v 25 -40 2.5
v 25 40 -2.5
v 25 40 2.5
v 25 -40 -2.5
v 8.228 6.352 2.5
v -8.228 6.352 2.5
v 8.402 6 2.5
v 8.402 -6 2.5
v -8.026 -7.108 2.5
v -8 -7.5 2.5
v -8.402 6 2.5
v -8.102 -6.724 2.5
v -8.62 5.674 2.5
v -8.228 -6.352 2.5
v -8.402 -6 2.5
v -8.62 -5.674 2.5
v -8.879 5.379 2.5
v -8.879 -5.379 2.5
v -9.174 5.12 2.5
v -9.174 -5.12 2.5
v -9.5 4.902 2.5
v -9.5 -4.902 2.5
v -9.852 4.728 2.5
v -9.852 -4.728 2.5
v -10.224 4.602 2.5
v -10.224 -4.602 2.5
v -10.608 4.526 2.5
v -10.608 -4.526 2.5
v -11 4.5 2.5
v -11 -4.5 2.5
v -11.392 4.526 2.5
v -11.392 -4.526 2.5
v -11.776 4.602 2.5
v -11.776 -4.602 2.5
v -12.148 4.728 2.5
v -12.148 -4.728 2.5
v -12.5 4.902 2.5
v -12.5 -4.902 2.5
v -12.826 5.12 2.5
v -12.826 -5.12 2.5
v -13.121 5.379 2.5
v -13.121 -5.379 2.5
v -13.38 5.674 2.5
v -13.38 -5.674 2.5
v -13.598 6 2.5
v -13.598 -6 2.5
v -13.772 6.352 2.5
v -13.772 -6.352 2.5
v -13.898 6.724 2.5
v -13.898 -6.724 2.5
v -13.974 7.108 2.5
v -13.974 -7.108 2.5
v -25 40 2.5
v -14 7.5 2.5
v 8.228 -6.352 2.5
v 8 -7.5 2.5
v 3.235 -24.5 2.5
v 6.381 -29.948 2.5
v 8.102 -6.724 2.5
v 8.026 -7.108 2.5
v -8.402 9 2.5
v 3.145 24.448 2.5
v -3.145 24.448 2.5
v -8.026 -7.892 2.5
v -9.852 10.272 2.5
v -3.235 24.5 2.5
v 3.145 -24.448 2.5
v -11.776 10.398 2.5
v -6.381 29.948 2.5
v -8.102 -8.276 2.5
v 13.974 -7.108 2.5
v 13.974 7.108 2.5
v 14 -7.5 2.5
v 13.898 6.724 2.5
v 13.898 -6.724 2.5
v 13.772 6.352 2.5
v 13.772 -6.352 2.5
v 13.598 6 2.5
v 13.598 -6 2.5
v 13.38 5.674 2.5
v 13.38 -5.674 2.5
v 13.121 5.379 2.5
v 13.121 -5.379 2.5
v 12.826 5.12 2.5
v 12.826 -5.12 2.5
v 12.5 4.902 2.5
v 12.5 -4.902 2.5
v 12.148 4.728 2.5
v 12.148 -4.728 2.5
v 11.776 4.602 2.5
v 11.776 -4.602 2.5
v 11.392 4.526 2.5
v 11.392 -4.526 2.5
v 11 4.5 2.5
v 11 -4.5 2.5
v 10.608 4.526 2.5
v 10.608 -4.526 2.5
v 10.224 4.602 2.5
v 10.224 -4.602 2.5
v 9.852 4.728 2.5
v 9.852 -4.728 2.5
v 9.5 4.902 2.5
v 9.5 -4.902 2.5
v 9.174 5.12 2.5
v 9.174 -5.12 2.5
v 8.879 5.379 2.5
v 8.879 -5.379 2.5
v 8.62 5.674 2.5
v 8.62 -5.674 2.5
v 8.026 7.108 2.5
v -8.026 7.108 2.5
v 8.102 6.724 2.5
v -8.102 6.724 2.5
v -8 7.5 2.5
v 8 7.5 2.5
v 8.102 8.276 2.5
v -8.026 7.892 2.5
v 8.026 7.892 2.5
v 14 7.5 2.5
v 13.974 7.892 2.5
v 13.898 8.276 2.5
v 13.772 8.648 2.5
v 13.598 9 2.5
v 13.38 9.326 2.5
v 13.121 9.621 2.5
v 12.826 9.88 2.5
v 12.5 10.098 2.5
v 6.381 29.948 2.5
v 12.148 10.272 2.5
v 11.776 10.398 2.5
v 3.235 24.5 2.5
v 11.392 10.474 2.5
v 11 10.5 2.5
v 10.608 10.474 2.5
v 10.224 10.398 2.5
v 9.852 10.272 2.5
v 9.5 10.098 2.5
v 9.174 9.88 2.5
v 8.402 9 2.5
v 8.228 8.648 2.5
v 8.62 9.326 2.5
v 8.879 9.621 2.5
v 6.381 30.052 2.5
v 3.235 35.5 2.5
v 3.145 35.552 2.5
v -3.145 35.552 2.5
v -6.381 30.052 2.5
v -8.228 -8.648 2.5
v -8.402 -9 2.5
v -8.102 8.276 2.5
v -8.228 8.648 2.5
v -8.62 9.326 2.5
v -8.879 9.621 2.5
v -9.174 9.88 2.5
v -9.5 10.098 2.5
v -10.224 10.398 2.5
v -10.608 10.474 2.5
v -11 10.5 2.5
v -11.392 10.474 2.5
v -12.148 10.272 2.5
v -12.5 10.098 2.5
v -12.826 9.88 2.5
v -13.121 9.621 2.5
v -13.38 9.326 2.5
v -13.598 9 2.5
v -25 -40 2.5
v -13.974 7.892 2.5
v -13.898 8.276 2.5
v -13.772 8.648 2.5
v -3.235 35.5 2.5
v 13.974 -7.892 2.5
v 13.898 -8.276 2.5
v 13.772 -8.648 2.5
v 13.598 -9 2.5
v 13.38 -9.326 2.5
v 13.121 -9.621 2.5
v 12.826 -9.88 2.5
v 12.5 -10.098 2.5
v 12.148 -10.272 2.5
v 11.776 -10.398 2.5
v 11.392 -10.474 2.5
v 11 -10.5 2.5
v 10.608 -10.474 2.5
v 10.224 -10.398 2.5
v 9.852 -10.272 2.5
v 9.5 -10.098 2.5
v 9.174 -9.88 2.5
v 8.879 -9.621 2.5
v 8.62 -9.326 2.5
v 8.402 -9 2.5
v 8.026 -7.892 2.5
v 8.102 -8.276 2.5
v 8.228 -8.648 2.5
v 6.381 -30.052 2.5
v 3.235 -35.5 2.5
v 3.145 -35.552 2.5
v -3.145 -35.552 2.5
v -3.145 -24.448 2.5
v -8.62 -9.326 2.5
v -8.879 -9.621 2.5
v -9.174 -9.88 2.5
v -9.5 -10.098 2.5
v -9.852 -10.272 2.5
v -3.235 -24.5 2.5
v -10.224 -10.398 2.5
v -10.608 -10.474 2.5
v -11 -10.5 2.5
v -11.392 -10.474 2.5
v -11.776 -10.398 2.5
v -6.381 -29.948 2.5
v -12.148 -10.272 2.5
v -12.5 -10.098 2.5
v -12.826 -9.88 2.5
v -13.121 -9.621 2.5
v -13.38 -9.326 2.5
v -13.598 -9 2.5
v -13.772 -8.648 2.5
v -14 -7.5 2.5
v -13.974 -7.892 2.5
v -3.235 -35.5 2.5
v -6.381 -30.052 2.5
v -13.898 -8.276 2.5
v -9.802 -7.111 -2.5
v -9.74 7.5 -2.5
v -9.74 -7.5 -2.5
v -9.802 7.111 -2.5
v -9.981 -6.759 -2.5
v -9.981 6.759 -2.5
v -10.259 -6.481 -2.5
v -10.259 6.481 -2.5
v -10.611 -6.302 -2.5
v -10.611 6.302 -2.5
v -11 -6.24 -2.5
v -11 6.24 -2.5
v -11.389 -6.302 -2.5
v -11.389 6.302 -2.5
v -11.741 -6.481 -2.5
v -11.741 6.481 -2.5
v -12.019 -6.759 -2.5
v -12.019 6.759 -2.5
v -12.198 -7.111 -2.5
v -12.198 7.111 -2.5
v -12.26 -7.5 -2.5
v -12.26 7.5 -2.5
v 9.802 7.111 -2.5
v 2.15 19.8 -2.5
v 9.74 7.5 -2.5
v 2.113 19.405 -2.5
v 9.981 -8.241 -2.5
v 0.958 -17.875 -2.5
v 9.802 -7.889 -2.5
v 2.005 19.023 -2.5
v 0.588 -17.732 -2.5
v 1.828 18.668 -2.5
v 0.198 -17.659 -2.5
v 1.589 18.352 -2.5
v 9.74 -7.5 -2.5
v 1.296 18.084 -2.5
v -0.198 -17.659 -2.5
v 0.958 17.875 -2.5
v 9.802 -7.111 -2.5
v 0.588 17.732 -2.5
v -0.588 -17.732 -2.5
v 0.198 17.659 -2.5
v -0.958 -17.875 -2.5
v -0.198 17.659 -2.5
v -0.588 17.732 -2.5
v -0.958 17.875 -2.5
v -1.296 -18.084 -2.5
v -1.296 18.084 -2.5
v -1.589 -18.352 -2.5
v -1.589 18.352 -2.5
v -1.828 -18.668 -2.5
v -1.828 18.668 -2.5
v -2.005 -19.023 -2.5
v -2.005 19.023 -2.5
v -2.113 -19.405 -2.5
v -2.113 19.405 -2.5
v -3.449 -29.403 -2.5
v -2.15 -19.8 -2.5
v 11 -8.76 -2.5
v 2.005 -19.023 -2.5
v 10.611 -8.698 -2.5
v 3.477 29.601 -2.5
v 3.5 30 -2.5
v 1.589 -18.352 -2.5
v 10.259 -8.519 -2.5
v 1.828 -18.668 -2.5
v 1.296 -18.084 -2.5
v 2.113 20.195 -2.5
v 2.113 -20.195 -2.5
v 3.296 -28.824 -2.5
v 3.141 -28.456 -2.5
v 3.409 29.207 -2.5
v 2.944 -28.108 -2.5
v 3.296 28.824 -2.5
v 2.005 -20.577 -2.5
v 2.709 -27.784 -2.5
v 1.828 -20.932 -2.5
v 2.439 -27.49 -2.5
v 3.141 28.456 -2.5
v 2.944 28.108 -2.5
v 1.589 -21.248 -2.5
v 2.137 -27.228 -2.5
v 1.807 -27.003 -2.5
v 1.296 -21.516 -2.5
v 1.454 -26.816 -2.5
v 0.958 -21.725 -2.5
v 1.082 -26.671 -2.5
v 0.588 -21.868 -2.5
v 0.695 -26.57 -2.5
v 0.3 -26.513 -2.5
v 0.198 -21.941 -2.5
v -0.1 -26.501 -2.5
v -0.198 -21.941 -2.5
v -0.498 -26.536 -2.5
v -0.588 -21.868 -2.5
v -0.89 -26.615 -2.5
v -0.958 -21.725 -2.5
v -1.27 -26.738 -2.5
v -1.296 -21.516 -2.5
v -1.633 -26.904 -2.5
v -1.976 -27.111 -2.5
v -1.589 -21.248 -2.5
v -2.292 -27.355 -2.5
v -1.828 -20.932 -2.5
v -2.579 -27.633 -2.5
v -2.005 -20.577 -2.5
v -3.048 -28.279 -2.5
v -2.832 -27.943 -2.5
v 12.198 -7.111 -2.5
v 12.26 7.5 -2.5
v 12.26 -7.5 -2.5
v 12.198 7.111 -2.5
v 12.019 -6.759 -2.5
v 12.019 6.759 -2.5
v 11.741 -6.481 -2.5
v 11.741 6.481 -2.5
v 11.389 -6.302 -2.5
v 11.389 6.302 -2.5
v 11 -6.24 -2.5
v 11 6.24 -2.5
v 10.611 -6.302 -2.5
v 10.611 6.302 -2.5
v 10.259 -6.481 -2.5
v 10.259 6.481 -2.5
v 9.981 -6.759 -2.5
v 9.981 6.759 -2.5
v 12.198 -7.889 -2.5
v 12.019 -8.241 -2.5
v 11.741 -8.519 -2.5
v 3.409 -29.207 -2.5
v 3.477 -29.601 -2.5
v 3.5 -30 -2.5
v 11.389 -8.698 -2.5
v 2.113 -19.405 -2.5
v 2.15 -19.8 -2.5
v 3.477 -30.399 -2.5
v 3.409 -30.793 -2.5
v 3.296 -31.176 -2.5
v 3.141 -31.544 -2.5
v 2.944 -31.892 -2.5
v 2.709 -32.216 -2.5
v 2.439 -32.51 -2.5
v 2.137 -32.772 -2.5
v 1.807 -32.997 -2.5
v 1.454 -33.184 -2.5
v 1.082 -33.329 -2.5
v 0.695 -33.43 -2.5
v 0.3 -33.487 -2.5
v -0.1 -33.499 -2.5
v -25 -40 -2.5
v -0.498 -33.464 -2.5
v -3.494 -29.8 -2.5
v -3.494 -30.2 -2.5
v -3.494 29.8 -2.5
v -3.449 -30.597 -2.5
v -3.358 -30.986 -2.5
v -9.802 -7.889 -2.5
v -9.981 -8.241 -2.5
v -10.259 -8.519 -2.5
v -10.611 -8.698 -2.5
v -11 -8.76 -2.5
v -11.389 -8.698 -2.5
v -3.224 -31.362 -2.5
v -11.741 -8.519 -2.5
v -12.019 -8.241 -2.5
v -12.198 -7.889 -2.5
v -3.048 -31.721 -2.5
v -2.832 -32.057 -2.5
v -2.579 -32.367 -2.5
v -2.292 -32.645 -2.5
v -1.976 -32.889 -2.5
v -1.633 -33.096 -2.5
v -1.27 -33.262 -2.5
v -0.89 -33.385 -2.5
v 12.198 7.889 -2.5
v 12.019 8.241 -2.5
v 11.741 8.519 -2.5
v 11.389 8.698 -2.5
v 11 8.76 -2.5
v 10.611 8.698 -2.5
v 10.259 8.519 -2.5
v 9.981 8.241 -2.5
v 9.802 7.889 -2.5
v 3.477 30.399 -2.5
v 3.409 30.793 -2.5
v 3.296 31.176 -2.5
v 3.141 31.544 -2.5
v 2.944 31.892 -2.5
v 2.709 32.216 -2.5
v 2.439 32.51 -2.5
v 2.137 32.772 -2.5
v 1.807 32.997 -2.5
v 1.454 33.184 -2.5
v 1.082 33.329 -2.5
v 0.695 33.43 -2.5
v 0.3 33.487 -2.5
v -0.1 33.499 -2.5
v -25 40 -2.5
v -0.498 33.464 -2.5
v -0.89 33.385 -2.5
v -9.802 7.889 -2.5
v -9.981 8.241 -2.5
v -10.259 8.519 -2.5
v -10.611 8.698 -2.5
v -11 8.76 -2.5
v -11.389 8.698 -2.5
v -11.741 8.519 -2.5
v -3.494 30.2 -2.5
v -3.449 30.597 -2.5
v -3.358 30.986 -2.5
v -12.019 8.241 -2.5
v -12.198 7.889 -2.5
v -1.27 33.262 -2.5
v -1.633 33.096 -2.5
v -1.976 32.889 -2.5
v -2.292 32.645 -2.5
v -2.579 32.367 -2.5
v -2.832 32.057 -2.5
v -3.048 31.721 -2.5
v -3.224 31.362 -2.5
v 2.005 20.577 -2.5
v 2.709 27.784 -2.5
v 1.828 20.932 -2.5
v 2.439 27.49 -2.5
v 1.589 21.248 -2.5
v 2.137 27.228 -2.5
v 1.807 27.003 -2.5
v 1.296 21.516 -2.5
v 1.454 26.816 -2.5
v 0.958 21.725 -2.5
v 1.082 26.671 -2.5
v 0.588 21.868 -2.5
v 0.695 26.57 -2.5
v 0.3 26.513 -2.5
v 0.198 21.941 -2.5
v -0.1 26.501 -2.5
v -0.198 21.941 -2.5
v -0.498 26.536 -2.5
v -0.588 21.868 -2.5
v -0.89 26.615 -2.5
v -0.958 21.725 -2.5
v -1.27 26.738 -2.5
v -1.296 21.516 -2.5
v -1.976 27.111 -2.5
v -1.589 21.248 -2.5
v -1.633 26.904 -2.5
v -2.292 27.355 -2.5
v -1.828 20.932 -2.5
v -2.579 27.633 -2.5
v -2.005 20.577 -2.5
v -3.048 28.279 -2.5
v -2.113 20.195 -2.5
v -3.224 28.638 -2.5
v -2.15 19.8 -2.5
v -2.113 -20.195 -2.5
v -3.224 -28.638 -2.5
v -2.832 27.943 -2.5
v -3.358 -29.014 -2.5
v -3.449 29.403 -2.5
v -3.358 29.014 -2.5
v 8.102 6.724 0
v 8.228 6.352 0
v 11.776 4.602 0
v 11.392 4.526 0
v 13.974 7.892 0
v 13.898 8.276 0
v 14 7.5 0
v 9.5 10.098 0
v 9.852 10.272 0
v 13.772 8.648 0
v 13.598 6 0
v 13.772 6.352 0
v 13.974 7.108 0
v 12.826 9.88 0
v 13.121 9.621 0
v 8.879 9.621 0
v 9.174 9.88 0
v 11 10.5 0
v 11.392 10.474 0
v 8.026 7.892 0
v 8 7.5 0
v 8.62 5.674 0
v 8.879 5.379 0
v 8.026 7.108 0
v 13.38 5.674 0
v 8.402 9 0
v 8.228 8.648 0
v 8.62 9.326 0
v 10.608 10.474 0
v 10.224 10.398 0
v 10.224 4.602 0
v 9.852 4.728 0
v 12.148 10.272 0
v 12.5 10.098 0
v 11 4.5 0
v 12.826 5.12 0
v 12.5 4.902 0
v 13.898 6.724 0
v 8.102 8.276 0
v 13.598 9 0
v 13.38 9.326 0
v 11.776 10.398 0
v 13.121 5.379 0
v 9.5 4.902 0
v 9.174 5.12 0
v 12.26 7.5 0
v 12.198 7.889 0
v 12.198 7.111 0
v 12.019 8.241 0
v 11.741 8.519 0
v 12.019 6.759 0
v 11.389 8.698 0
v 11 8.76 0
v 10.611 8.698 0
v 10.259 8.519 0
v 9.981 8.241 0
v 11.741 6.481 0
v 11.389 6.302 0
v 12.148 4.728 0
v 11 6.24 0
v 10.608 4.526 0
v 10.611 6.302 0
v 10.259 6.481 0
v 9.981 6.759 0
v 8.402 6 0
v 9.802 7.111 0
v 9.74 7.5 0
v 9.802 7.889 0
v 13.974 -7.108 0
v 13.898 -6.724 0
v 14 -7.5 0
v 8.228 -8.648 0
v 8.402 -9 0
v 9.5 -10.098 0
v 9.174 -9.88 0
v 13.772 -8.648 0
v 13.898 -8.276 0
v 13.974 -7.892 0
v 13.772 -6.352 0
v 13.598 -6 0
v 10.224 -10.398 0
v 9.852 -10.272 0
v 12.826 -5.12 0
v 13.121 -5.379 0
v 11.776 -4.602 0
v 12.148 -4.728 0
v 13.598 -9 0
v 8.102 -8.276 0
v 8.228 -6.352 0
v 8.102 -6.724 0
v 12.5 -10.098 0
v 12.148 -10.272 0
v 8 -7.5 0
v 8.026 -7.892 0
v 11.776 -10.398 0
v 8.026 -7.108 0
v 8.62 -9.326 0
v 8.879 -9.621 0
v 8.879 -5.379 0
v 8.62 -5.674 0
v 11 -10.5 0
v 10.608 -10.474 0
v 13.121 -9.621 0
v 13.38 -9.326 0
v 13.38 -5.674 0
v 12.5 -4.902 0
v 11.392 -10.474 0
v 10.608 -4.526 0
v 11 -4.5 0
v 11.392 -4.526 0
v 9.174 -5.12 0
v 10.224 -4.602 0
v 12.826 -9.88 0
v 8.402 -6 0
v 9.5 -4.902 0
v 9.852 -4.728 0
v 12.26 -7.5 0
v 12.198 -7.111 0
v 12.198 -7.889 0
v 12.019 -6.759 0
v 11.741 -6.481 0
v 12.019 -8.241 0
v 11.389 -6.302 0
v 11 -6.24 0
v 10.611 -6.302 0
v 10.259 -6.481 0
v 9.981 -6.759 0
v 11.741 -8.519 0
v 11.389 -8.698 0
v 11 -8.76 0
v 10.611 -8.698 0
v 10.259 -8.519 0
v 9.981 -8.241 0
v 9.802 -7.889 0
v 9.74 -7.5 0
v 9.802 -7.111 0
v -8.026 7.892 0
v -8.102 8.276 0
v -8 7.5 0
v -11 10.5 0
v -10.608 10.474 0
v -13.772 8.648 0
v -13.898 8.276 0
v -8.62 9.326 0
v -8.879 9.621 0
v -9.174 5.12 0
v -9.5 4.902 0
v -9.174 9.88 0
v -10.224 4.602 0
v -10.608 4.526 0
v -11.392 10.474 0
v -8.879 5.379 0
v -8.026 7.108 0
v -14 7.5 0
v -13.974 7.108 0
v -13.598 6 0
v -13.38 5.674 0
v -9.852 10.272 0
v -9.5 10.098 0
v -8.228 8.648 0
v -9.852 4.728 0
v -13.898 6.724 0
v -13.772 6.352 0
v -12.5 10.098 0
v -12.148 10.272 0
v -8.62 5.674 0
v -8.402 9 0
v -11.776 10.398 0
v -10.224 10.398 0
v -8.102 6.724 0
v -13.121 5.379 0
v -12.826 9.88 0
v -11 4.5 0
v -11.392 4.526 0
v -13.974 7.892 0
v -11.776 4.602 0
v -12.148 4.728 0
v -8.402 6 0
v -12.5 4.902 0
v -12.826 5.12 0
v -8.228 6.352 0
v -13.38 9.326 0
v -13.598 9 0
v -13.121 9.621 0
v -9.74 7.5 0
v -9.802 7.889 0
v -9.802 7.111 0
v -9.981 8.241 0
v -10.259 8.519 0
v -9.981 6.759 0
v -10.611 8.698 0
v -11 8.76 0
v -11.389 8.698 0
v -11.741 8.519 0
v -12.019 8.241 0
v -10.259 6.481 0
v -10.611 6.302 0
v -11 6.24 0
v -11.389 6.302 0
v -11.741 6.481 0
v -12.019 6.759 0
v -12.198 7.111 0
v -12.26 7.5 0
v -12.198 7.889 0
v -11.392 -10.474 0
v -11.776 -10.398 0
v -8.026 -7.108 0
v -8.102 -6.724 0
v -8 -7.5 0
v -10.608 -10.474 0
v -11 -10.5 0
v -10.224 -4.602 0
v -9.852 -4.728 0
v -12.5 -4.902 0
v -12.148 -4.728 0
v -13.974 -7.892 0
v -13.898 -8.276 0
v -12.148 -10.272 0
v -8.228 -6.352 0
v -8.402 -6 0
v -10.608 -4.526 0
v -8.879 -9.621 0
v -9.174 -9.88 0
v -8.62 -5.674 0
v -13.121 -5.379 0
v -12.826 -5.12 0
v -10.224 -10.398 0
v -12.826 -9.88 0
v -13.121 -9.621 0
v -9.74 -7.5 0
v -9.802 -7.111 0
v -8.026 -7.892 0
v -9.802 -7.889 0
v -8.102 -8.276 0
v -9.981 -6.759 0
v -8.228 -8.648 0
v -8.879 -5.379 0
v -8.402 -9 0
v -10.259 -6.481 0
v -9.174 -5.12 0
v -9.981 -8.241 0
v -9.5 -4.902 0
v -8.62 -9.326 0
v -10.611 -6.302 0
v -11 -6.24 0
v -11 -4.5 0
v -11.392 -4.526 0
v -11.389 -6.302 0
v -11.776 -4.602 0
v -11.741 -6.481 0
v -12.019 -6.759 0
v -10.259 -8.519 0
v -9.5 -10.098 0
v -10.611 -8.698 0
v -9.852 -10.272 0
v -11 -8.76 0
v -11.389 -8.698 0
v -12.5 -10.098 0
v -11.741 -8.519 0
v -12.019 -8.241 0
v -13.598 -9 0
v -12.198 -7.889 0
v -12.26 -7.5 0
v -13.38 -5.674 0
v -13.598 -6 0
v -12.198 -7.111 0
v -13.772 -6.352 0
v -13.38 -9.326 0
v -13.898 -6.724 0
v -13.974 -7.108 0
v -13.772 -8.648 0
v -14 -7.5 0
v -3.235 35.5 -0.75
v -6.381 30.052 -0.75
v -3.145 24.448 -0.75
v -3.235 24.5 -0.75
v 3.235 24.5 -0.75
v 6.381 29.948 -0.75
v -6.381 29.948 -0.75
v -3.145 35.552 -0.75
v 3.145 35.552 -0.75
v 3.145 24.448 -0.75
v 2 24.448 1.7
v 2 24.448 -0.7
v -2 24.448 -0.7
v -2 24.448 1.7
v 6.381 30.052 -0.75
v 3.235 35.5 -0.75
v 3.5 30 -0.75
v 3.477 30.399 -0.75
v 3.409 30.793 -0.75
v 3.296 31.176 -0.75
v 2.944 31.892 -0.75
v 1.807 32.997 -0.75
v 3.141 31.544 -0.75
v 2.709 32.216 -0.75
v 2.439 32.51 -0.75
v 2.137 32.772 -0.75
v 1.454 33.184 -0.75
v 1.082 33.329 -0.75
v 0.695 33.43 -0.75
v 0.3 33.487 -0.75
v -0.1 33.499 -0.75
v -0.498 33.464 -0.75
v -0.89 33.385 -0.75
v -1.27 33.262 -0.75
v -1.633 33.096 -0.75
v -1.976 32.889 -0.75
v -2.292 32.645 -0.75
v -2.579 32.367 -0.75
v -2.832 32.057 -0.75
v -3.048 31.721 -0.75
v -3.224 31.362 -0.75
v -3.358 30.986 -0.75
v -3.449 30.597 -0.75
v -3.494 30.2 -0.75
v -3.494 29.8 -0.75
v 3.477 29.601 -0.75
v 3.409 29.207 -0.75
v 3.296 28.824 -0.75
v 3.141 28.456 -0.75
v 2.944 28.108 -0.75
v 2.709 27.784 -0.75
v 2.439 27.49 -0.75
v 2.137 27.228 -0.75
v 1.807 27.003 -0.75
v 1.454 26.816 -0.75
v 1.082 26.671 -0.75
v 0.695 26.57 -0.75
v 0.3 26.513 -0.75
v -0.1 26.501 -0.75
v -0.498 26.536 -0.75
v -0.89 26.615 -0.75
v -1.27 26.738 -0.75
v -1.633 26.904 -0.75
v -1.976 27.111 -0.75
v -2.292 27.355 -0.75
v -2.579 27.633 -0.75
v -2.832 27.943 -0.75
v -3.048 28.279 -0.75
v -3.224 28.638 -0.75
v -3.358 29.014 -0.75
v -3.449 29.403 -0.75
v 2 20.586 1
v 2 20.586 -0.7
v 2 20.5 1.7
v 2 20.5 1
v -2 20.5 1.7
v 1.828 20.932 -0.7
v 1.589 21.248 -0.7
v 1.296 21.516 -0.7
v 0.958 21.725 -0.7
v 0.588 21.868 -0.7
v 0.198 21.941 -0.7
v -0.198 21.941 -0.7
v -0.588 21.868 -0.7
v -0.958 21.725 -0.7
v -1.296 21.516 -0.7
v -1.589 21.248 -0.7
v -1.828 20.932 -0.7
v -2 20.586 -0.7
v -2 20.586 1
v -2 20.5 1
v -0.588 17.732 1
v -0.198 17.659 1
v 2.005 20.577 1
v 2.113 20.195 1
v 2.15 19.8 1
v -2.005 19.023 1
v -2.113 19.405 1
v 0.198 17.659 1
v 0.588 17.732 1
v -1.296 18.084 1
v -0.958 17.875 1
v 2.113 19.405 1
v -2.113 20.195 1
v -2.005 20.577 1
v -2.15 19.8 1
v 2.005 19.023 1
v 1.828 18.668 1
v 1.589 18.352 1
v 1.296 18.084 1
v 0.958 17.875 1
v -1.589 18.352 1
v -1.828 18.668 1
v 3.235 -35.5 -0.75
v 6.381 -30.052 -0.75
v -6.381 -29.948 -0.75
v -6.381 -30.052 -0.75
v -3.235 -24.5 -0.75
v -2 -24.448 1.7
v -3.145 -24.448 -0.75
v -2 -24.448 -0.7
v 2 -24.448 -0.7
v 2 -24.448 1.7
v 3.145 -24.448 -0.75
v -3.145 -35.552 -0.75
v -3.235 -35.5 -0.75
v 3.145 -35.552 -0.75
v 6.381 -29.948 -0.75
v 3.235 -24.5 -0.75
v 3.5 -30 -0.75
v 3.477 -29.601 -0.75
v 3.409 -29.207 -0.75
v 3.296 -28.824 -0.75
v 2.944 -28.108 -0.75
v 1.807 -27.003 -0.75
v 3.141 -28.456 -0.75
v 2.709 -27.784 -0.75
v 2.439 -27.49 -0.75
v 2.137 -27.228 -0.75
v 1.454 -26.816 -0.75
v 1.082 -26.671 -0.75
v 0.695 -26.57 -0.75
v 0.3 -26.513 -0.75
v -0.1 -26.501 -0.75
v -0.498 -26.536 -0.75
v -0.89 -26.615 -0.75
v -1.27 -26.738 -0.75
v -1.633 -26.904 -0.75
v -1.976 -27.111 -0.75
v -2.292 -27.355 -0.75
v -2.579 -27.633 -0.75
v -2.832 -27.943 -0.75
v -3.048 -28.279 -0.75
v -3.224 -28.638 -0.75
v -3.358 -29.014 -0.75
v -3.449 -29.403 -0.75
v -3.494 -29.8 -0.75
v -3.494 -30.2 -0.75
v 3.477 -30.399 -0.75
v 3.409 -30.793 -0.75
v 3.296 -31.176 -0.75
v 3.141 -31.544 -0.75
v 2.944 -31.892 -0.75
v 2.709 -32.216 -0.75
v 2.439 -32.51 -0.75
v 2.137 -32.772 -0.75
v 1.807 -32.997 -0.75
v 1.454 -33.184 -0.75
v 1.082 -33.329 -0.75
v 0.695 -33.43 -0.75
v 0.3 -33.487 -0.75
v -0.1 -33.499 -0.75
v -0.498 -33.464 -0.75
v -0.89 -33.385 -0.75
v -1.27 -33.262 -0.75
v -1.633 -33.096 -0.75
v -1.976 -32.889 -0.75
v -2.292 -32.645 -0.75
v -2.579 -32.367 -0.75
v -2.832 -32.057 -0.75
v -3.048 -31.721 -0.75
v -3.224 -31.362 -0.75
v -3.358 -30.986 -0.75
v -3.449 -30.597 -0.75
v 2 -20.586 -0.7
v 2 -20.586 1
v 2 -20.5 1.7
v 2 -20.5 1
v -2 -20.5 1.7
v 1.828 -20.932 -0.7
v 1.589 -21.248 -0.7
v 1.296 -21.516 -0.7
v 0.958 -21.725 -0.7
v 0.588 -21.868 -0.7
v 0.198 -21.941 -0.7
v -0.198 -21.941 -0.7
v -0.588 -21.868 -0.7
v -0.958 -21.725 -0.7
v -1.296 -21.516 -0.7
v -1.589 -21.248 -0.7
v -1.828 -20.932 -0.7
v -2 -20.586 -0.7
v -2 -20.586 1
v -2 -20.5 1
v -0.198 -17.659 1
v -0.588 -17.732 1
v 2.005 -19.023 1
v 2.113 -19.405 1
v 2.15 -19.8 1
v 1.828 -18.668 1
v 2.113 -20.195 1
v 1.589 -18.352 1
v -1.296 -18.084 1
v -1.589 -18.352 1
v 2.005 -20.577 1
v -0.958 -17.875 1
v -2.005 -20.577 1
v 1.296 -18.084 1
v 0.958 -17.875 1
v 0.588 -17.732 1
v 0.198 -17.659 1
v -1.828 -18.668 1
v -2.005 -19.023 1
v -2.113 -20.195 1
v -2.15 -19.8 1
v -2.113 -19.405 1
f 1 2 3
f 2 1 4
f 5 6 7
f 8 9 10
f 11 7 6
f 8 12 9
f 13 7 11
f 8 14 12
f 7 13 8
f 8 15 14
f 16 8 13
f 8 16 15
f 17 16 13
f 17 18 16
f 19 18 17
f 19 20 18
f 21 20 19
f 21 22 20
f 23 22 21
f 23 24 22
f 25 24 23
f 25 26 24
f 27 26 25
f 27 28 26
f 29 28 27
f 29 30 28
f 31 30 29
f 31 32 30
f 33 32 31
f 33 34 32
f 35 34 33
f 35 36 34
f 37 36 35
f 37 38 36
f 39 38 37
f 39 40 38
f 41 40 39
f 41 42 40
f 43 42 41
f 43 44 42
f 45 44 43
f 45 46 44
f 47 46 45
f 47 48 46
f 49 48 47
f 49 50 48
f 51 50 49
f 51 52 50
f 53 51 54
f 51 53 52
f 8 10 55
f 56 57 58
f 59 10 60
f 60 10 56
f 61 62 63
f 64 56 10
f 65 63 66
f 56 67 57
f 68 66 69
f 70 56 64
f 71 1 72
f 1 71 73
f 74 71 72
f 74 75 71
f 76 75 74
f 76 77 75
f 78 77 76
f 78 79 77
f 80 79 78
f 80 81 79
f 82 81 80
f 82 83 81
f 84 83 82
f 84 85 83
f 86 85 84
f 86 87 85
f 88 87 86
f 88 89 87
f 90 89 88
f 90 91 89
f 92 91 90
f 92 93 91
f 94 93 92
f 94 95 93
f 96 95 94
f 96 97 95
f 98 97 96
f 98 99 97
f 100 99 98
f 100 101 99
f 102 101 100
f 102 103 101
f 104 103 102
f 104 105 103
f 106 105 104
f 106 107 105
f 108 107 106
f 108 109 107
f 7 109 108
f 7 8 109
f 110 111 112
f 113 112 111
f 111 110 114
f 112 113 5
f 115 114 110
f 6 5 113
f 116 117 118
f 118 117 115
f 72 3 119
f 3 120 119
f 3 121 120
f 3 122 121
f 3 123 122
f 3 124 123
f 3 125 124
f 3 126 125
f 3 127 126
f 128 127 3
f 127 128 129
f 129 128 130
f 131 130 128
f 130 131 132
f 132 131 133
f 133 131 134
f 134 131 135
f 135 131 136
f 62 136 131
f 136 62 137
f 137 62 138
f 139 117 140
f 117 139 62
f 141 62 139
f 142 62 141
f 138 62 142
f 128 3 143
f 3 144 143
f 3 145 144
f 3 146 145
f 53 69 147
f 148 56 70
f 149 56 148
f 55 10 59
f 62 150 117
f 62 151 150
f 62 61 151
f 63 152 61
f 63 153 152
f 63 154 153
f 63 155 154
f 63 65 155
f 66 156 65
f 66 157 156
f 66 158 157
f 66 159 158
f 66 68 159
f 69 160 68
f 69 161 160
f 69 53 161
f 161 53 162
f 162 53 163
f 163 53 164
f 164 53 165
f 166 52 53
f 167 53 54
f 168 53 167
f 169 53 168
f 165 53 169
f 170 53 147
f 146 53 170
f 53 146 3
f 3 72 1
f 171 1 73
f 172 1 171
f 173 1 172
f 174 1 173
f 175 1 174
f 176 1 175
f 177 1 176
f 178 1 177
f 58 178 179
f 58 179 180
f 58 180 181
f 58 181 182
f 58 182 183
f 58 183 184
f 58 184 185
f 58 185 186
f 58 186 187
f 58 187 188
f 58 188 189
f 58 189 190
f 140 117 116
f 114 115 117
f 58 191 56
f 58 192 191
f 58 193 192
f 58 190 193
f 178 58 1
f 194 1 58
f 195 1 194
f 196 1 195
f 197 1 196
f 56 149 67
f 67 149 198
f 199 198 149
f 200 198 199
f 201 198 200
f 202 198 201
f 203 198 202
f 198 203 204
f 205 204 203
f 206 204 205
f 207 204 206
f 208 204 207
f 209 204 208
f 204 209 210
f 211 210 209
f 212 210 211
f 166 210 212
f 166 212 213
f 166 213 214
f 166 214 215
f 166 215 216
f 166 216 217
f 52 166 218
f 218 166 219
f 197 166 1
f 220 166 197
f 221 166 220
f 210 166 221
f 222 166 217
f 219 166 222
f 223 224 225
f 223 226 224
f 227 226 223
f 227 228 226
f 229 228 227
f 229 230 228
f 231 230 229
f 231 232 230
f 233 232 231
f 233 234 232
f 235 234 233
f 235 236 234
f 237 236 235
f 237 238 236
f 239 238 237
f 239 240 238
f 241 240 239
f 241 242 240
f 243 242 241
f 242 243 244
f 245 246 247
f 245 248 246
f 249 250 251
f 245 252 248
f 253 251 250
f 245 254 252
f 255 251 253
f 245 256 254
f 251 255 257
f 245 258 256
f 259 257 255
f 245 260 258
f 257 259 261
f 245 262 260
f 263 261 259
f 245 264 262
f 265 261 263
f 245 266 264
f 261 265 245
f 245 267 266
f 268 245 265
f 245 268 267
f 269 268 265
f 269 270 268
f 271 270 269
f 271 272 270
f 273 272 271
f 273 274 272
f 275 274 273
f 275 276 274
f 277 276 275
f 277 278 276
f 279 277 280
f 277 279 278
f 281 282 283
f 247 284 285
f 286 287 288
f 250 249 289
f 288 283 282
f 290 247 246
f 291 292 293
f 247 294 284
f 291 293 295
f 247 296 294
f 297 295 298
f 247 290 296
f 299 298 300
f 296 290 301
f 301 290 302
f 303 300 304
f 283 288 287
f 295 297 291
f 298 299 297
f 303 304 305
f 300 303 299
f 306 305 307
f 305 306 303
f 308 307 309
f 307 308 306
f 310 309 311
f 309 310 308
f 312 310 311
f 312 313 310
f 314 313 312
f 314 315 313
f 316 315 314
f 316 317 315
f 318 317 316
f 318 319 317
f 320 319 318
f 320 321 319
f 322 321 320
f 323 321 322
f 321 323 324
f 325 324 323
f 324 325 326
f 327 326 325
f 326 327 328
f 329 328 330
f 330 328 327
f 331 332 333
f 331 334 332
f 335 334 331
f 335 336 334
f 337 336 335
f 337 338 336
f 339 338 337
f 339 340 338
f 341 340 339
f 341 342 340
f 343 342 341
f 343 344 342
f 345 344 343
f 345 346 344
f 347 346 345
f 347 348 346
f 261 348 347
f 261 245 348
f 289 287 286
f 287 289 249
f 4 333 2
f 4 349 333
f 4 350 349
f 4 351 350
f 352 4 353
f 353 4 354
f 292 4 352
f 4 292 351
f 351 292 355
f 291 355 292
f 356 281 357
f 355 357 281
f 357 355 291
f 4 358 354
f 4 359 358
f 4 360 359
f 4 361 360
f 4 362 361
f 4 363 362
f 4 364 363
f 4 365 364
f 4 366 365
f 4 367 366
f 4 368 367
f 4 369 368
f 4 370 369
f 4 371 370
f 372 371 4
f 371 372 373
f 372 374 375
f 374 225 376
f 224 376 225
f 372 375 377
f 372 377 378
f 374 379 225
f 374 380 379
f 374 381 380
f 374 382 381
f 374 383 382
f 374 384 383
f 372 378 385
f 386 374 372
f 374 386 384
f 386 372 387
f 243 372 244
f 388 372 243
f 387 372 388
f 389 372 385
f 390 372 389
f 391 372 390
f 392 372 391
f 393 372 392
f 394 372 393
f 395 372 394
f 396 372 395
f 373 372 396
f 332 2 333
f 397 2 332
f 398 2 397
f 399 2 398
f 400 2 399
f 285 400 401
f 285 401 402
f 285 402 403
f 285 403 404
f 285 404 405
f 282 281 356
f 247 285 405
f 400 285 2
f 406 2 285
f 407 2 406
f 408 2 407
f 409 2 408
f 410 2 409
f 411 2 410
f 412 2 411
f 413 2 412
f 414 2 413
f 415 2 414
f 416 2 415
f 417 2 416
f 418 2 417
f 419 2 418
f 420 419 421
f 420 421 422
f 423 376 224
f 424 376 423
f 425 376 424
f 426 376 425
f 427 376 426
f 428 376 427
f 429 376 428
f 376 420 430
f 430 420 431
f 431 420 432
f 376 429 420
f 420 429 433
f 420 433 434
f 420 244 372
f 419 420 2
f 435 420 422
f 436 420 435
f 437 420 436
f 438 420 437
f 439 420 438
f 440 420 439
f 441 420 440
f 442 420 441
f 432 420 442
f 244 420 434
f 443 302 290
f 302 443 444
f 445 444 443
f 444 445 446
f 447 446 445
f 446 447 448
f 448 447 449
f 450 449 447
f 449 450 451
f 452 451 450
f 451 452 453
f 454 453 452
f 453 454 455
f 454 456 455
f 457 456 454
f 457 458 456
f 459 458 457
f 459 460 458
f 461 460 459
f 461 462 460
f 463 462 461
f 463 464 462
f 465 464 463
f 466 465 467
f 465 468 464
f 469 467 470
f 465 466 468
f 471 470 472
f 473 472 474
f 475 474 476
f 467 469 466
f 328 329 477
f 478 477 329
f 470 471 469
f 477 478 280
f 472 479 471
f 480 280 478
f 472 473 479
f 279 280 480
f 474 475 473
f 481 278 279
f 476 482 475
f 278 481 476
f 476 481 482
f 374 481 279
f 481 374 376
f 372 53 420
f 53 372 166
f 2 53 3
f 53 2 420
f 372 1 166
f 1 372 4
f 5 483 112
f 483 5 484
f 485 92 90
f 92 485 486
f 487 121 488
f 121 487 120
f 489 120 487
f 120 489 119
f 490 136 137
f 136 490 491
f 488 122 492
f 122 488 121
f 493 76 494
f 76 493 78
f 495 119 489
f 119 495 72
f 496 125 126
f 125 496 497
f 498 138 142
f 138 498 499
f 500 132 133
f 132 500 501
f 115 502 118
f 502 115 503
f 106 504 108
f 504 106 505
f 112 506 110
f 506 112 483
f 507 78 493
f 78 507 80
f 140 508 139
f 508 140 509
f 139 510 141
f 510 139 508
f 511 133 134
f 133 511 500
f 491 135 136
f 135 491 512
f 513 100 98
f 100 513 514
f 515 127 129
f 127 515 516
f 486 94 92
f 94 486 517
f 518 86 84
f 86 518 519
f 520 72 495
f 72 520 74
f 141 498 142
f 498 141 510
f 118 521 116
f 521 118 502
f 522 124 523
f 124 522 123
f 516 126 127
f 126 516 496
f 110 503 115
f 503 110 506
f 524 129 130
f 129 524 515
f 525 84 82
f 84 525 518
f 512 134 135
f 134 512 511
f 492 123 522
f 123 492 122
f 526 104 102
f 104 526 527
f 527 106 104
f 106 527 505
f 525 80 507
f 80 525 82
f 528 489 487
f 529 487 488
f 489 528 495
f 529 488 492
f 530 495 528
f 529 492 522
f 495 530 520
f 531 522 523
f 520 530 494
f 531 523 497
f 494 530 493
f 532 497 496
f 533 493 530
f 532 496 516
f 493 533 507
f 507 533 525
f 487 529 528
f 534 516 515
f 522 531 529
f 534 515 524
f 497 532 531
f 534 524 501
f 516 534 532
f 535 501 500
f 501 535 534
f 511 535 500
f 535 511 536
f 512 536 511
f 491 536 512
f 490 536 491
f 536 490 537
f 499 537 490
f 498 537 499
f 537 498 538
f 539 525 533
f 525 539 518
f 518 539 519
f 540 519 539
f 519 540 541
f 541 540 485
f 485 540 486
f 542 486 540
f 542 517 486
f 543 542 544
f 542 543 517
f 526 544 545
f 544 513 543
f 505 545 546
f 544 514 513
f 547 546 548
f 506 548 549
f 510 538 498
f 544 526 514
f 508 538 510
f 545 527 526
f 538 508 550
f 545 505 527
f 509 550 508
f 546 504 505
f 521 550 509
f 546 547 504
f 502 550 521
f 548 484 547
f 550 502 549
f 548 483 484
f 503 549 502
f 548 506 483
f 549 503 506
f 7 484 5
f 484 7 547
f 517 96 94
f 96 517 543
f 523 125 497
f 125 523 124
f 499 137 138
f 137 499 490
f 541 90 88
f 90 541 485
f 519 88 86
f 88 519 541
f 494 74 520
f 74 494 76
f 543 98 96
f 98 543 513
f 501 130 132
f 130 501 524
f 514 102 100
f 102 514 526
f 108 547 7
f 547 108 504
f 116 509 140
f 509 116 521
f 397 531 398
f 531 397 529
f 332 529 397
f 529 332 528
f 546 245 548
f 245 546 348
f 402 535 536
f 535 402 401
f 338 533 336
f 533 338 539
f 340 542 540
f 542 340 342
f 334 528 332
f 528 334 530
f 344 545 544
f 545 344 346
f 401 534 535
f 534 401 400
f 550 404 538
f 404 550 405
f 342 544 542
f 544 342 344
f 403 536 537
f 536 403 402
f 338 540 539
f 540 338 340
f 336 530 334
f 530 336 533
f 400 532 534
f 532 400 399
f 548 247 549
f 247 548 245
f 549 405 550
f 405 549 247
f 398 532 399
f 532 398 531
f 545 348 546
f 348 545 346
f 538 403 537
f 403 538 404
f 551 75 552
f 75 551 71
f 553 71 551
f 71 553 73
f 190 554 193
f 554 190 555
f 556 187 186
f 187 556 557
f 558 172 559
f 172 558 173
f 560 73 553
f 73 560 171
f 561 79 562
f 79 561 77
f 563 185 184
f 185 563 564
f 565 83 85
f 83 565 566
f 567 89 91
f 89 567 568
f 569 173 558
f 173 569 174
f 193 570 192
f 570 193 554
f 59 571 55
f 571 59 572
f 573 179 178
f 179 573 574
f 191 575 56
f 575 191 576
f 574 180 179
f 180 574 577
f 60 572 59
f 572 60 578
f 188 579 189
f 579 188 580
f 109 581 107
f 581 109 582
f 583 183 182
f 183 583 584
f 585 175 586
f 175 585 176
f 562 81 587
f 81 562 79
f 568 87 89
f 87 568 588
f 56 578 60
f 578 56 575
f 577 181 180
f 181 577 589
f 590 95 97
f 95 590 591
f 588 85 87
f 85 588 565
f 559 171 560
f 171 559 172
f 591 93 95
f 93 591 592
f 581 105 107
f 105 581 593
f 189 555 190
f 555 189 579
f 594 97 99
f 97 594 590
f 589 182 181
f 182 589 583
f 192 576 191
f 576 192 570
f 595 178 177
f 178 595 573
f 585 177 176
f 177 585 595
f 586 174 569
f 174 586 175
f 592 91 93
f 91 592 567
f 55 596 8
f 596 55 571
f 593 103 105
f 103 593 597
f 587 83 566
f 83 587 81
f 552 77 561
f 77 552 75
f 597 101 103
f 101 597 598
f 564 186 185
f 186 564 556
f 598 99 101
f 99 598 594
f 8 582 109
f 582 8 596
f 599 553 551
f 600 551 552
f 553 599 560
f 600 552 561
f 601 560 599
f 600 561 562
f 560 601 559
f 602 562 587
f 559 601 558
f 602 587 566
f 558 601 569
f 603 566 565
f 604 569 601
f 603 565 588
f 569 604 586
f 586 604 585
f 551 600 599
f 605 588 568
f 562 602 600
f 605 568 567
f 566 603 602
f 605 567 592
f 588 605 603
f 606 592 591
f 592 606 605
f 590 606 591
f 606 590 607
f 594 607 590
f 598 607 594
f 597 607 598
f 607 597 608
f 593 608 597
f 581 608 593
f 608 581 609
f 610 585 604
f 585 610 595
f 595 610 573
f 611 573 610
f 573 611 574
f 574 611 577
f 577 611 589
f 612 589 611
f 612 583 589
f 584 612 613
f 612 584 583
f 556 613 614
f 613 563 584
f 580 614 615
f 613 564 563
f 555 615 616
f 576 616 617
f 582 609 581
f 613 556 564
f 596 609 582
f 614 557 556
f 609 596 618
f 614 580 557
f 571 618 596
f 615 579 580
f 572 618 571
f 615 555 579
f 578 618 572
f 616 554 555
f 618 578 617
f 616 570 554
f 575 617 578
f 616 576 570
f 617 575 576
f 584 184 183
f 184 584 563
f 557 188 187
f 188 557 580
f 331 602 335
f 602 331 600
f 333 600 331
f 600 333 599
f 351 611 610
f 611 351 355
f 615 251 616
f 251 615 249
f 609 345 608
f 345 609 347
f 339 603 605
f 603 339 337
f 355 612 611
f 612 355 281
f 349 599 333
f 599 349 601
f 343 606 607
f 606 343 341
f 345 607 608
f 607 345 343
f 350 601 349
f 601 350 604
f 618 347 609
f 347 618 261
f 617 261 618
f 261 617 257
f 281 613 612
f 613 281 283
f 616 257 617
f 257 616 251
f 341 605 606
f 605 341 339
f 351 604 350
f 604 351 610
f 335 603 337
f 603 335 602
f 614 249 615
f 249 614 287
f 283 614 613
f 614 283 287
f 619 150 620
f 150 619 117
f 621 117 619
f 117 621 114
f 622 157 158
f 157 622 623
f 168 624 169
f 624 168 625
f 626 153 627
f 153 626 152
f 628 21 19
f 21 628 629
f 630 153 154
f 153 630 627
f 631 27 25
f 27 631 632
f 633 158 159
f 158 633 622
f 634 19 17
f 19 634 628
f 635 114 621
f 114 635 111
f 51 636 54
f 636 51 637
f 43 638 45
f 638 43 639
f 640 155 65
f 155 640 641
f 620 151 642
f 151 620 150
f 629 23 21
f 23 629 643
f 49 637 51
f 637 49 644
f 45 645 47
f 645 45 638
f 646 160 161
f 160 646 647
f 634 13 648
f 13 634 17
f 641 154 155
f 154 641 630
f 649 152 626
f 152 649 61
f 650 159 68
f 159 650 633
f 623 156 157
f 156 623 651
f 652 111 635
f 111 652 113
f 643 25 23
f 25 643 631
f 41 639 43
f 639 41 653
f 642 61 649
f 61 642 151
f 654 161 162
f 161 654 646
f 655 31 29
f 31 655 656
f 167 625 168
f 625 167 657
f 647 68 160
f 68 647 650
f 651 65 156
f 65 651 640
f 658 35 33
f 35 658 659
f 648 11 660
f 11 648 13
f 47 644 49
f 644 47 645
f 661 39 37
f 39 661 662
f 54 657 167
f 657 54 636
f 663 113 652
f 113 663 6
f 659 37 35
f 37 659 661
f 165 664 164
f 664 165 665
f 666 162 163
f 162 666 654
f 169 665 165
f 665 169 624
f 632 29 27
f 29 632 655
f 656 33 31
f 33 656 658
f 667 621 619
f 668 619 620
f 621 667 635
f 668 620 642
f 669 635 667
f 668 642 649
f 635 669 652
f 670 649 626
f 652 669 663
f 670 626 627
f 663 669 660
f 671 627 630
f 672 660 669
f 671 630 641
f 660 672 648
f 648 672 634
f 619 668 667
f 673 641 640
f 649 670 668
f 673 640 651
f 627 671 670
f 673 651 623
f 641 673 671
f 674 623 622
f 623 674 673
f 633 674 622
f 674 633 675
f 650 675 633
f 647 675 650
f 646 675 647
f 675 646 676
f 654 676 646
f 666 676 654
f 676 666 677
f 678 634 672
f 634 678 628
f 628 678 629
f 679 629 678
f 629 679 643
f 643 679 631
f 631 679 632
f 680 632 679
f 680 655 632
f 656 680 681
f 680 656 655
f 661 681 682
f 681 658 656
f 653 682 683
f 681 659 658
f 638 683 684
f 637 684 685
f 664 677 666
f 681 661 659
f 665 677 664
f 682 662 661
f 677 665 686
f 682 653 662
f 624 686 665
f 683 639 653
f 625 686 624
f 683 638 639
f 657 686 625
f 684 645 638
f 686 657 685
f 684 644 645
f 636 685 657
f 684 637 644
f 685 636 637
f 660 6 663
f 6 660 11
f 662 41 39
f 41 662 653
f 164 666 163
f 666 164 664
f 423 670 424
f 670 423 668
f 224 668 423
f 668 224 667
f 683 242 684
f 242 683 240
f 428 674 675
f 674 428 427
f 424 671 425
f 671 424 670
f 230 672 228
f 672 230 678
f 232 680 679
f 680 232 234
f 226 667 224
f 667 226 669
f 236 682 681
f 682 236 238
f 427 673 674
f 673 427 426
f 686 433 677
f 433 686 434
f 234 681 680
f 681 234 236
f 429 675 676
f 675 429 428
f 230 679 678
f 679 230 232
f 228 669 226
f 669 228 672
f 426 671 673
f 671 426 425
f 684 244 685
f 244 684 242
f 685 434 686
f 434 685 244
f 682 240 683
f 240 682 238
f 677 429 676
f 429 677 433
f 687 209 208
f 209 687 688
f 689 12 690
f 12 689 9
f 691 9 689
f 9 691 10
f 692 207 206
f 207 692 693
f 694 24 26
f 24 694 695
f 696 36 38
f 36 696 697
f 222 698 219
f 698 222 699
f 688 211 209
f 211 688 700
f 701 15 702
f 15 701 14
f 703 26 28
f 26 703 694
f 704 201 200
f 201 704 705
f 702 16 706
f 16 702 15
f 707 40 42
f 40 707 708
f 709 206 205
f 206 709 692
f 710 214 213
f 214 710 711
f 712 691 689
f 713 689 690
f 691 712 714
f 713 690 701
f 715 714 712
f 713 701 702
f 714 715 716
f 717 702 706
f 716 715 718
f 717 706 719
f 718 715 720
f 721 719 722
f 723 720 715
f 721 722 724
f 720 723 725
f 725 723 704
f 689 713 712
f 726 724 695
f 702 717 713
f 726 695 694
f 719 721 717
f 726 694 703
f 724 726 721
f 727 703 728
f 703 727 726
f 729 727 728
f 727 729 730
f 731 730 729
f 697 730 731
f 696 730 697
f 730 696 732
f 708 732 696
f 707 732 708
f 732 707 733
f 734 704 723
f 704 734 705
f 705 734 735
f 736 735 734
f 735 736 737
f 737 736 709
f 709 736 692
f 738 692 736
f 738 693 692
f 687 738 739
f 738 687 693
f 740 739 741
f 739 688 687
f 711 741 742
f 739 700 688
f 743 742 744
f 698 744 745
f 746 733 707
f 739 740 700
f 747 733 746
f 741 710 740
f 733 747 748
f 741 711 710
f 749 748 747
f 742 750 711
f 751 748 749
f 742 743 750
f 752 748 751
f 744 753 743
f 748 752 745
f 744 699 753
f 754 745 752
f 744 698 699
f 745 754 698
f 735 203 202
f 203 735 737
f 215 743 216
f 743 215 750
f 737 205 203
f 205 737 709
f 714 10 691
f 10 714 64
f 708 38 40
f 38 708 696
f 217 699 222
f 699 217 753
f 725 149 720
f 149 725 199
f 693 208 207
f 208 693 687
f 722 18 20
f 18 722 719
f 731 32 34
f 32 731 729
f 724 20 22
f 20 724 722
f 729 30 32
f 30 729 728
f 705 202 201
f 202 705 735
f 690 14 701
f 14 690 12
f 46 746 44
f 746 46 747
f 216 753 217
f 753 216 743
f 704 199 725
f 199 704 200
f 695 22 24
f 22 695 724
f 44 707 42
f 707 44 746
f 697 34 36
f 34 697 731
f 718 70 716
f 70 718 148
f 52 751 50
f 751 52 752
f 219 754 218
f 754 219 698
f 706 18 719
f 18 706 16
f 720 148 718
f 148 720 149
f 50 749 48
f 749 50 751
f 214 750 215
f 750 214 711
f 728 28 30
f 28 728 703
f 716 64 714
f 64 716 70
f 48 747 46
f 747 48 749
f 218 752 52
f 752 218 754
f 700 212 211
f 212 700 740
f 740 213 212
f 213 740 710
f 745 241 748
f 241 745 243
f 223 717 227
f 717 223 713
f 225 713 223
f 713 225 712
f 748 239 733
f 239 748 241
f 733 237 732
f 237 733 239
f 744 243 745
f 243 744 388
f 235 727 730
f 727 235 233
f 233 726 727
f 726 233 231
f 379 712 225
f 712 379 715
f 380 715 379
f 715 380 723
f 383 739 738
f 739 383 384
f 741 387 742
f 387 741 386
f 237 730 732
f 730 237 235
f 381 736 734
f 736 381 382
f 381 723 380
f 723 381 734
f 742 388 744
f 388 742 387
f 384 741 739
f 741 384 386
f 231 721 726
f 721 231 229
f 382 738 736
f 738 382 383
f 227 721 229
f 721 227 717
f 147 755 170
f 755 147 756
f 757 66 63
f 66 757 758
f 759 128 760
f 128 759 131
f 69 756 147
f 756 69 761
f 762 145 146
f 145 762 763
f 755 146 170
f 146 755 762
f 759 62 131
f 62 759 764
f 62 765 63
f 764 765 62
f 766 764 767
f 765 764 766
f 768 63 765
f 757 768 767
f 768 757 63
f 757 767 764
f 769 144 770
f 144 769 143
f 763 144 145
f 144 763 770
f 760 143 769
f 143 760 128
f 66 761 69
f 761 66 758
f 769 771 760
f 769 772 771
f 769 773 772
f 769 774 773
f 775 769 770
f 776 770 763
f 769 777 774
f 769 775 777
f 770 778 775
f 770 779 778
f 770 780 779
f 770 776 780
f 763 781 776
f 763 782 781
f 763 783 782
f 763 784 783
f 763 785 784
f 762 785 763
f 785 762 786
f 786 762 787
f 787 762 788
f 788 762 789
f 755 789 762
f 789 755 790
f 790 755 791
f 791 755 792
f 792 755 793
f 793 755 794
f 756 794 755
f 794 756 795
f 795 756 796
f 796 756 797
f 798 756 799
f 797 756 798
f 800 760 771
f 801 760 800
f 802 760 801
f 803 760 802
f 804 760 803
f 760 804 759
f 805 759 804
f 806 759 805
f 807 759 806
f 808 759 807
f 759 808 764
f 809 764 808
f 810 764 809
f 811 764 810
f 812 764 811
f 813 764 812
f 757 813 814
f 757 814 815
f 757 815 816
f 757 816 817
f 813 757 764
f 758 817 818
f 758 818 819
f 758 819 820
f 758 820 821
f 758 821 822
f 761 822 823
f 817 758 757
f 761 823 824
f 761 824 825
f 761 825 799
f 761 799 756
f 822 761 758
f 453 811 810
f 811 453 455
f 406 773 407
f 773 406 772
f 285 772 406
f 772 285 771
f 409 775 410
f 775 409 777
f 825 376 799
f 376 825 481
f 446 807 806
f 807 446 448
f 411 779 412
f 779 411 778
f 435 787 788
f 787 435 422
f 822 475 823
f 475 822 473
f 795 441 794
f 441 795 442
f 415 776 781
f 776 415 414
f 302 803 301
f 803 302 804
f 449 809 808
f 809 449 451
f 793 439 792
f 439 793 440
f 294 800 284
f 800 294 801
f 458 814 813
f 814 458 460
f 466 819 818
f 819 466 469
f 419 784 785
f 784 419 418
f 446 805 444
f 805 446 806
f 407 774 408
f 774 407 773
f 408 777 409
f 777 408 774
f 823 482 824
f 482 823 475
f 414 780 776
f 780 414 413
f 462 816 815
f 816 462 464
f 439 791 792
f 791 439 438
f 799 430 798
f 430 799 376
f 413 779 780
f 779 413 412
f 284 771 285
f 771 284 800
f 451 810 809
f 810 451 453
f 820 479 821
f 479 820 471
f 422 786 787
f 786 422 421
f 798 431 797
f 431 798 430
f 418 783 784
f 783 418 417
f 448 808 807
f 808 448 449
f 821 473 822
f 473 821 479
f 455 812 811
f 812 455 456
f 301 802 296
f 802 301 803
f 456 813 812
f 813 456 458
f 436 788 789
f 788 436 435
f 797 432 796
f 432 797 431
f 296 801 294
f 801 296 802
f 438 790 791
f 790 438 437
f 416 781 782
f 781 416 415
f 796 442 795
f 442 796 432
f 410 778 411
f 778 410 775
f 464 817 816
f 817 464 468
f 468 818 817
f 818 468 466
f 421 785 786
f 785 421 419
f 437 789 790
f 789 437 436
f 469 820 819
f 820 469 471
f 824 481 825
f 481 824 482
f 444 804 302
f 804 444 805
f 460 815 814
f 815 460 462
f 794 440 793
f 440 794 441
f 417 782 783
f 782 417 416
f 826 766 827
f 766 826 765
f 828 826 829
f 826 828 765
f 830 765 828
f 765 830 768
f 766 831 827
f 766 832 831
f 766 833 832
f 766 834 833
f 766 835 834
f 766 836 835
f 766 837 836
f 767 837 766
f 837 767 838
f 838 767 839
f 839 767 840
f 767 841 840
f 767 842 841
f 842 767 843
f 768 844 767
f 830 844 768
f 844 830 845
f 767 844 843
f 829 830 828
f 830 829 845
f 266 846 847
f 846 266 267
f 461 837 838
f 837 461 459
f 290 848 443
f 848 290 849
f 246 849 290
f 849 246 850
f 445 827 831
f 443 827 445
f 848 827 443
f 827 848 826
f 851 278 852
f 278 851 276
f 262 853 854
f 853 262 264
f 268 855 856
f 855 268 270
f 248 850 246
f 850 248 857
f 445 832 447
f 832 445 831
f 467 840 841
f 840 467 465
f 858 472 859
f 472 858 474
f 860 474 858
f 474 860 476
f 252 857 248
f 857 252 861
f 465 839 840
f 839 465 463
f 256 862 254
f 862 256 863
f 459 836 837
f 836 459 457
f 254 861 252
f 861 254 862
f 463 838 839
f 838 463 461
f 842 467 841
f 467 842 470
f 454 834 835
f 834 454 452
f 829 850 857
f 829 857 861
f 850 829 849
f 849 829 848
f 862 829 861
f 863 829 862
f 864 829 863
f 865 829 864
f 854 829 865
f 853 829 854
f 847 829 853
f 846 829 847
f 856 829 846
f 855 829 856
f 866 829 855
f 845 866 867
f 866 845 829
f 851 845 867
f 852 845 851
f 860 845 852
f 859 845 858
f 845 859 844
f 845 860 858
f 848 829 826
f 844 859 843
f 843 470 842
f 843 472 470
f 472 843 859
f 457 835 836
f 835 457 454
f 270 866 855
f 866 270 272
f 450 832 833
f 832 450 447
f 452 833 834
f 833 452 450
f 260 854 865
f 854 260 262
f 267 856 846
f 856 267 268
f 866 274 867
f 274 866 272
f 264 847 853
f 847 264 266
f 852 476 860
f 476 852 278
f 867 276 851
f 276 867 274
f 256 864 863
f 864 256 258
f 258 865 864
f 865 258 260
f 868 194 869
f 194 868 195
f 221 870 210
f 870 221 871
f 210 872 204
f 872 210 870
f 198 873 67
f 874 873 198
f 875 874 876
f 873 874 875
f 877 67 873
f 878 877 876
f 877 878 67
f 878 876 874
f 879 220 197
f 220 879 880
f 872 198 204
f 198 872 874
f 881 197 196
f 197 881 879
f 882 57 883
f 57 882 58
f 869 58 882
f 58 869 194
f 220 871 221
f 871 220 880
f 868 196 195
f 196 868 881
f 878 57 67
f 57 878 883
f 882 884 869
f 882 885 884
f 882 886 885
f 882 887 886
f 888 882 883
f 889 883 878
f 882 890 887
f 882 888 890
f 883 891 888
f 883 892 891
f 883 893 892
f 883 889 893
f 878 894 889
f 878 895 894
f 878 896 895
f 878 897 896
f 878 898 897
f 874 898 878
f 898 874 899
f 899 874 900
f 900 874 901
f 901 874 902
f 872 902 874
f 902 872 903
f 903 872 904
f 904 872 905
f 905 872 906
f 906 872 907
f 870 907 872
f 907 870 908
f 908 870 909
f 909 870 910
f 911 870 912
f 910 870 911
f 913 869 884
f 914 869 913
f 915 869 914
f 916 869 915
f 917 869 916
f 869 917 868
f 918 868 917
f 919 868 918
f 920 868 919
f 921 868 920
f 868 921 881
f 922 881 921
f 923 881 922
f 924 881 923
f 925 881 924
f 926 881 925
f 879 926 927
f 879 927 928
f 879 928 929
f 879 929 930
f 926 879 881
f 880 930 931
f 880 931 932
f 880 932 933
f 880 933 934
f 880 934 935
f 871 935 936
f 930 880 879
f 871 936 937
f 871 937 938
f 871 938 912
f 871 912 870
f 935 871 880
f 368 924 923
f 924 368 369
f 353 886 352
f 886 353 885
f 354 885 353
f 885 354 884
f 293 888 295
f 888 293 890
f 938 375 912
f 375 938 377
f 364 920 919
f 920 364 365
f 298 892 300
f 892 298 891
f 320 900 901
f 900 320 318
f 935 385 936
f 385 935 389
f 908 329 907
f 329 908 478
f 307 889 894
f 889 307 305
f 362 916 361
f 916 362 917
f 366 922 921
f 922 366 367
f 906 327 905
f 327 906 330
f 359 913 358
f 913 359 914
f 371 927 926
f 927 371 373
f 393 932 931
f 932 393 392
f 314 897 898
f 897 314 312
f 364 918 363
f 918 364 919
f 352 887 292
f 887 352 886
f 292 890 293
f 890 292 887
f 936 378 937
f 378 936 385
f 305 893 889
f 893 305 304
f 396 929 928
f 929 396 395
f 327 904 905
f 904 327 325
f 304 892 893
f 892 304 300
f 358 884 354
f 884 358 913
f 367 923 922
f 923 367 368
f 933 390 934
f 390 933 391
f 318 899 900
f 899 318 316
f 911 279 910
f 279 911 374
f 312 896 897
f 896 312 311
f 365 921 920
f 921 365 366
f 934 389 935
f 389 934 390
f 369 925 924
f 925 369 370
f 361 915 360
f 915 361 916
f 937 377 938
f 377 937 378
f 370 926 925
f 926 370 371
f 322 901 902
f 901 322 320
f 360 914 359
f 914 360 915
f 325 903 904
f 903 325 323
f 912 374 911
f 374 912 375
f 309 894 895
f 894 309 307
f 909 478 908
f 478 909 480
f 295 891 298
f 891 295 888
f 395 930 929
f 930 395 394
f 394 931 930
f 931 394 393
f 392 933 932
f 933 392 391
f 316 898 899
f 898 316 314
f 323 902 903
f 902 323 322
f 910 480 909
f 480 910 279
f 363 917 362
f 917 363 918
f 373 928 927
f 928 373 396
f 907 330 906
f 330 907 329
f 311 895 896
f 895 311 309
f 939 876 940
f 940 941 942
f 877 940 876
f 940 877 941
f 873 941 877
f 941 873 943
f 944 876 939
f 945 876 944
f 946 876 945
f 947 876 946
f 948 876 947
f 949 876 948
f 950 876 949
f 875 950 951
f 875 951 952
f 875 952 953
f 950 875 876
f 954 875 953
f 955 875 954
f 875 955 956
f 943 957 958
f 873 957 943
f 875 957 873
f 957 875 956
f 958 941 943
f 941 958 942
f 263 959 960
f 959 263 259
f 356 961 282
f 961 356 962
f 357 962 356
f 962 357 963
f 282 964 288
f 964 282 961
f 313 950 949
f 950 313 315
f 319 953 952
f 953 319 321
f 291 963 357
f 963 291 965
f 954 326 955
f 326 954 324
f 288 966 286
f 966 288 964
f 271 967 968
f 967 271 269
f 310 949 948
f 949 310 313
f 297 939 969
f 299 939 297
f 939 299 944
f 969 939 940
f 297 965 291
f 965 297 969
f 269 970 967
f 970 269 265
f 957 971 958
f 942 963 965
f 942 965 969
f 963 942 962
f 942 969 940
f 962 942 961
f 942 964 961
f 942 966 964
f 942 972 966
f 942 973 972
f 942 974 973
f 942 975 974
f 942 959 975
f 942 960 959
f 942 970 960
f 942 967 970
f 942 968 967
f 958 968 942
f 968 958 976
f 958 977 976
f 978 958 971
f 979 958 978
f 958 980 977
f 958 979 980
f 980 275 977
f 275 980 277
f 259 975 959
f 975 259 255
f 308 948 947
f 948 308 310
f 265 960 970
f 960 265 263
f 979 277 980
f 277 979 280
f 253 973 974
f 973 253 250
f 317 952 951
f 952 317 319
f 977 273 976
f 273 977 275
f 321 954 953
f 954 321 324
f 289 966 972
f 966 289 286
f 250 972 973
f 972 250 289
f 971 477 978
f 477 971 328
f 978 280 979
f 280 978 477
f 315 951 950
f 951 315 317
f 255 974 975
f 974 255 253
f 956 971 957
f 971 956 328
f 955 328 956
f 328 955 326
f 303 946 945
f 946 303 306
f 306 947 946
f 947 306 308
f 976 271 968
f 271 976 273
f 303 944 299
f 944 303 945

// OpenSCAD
$fa = 1;
$fs = 0.4;

module phex(wid,rad,height){
hull(){
translate([wid/2-rad,0,0])cylinder(r=rad,h=height);
rotate([0,0,60])translate([wid/2-rad,0,0])cylinder(r=rad,h=height);
rotate([0,0,120])translate([wid/2-rad,0,0])cylinder(r=rad,h=height);
rotate([0,0,180])translate([wid/2-rad,0,0])cylinder(r=rad,h=height);
rotate([0,0,240])translate([wid/2-rad,0,0])cylinder(r=rad,h=height);
rotate([0,0,300])translate([wid/2-rad,0,0])cylinder(r=rad,h=height);

}
}

module fhex(wid,height){
hull(){
cube([wid/1.7,wid,height],center = true);
rotate([0,0,120])cube([wid/1.7,wid,height],center = true);
rotate([0,0,240])cube([wid/1.7,wid,height],center = true);
}
}




difference(){
cube([50
,80,5],center=true);

translate([11,7.5,(2.24+0.5)/2])
cylinder(h=2.24+0.5+0.001,r=6/2,center=true);

translate([11,7.5,0])
cylinder(h=5.5+0.001,r=2.52/2,center=true);

translate([11,-7.5,(2.24+0.5)/2])
cylinder(h=2.24+0.5+0.001,r=6/2,center=true);
translate([11,-7.5,0])
cylinder(h=5+0.5+0.001,r=2.52/2,center=true);

translate([-11,7.5,(2.24+0.5)/2])
cylinder(h=2.24+0.5+0.001,r=6/2,center=true);
translate([-11,7.5,0])
cylinder(h=5+0.5+0.001,r=2.52/2,center=true);
    
translate([-11,-7.5,(2.24+0.5)/2])
cylinder(h=2.24+0.5+0.001,r=6/2,center=true);
translate([-11,-7.5,0])
cylinder(h=5+0.001,r=2.52/2,center=true);


//hexagono superior 
translate([0,30,1.2])
fhex(11,4-0.1);

//hueco para bulon concentrico a hexagono
translate([0,30,1.5])
cylinder(h=8+0.001,r=7/2,center=true);

//hueco rectangular 37mm-5(ancho de hexagono)-largo/2 de hueco
translate([0,30-5-4/2,1/2])
color([1,0,1])cube([4
,5,2.4],center=true);


// Cilindro al final del hueco 32-Ltotal-radio/2
translate([0,30-5-4.5-1.4/2,-1])
cylinder(h=4+0.001,r=2.15,center=true);

//hexagono inferior

translate([0,-30,1.2])
fhex(11,4-0.1);

translate([0,-30,1.5])
cylinder(h=8+0.001,r=7/2,center=true); 

translate([0,-30+5+4/2,1/2])
color([1,0,0])cube([4
,5,2.4],center=true);

translate([0,-30+5+4.5+1.4/2,-1])
cylinder(h=4+0.001,r=2.15,center=true);

}

//color([100,0,1])cube([300,300,4-1], center=true);
